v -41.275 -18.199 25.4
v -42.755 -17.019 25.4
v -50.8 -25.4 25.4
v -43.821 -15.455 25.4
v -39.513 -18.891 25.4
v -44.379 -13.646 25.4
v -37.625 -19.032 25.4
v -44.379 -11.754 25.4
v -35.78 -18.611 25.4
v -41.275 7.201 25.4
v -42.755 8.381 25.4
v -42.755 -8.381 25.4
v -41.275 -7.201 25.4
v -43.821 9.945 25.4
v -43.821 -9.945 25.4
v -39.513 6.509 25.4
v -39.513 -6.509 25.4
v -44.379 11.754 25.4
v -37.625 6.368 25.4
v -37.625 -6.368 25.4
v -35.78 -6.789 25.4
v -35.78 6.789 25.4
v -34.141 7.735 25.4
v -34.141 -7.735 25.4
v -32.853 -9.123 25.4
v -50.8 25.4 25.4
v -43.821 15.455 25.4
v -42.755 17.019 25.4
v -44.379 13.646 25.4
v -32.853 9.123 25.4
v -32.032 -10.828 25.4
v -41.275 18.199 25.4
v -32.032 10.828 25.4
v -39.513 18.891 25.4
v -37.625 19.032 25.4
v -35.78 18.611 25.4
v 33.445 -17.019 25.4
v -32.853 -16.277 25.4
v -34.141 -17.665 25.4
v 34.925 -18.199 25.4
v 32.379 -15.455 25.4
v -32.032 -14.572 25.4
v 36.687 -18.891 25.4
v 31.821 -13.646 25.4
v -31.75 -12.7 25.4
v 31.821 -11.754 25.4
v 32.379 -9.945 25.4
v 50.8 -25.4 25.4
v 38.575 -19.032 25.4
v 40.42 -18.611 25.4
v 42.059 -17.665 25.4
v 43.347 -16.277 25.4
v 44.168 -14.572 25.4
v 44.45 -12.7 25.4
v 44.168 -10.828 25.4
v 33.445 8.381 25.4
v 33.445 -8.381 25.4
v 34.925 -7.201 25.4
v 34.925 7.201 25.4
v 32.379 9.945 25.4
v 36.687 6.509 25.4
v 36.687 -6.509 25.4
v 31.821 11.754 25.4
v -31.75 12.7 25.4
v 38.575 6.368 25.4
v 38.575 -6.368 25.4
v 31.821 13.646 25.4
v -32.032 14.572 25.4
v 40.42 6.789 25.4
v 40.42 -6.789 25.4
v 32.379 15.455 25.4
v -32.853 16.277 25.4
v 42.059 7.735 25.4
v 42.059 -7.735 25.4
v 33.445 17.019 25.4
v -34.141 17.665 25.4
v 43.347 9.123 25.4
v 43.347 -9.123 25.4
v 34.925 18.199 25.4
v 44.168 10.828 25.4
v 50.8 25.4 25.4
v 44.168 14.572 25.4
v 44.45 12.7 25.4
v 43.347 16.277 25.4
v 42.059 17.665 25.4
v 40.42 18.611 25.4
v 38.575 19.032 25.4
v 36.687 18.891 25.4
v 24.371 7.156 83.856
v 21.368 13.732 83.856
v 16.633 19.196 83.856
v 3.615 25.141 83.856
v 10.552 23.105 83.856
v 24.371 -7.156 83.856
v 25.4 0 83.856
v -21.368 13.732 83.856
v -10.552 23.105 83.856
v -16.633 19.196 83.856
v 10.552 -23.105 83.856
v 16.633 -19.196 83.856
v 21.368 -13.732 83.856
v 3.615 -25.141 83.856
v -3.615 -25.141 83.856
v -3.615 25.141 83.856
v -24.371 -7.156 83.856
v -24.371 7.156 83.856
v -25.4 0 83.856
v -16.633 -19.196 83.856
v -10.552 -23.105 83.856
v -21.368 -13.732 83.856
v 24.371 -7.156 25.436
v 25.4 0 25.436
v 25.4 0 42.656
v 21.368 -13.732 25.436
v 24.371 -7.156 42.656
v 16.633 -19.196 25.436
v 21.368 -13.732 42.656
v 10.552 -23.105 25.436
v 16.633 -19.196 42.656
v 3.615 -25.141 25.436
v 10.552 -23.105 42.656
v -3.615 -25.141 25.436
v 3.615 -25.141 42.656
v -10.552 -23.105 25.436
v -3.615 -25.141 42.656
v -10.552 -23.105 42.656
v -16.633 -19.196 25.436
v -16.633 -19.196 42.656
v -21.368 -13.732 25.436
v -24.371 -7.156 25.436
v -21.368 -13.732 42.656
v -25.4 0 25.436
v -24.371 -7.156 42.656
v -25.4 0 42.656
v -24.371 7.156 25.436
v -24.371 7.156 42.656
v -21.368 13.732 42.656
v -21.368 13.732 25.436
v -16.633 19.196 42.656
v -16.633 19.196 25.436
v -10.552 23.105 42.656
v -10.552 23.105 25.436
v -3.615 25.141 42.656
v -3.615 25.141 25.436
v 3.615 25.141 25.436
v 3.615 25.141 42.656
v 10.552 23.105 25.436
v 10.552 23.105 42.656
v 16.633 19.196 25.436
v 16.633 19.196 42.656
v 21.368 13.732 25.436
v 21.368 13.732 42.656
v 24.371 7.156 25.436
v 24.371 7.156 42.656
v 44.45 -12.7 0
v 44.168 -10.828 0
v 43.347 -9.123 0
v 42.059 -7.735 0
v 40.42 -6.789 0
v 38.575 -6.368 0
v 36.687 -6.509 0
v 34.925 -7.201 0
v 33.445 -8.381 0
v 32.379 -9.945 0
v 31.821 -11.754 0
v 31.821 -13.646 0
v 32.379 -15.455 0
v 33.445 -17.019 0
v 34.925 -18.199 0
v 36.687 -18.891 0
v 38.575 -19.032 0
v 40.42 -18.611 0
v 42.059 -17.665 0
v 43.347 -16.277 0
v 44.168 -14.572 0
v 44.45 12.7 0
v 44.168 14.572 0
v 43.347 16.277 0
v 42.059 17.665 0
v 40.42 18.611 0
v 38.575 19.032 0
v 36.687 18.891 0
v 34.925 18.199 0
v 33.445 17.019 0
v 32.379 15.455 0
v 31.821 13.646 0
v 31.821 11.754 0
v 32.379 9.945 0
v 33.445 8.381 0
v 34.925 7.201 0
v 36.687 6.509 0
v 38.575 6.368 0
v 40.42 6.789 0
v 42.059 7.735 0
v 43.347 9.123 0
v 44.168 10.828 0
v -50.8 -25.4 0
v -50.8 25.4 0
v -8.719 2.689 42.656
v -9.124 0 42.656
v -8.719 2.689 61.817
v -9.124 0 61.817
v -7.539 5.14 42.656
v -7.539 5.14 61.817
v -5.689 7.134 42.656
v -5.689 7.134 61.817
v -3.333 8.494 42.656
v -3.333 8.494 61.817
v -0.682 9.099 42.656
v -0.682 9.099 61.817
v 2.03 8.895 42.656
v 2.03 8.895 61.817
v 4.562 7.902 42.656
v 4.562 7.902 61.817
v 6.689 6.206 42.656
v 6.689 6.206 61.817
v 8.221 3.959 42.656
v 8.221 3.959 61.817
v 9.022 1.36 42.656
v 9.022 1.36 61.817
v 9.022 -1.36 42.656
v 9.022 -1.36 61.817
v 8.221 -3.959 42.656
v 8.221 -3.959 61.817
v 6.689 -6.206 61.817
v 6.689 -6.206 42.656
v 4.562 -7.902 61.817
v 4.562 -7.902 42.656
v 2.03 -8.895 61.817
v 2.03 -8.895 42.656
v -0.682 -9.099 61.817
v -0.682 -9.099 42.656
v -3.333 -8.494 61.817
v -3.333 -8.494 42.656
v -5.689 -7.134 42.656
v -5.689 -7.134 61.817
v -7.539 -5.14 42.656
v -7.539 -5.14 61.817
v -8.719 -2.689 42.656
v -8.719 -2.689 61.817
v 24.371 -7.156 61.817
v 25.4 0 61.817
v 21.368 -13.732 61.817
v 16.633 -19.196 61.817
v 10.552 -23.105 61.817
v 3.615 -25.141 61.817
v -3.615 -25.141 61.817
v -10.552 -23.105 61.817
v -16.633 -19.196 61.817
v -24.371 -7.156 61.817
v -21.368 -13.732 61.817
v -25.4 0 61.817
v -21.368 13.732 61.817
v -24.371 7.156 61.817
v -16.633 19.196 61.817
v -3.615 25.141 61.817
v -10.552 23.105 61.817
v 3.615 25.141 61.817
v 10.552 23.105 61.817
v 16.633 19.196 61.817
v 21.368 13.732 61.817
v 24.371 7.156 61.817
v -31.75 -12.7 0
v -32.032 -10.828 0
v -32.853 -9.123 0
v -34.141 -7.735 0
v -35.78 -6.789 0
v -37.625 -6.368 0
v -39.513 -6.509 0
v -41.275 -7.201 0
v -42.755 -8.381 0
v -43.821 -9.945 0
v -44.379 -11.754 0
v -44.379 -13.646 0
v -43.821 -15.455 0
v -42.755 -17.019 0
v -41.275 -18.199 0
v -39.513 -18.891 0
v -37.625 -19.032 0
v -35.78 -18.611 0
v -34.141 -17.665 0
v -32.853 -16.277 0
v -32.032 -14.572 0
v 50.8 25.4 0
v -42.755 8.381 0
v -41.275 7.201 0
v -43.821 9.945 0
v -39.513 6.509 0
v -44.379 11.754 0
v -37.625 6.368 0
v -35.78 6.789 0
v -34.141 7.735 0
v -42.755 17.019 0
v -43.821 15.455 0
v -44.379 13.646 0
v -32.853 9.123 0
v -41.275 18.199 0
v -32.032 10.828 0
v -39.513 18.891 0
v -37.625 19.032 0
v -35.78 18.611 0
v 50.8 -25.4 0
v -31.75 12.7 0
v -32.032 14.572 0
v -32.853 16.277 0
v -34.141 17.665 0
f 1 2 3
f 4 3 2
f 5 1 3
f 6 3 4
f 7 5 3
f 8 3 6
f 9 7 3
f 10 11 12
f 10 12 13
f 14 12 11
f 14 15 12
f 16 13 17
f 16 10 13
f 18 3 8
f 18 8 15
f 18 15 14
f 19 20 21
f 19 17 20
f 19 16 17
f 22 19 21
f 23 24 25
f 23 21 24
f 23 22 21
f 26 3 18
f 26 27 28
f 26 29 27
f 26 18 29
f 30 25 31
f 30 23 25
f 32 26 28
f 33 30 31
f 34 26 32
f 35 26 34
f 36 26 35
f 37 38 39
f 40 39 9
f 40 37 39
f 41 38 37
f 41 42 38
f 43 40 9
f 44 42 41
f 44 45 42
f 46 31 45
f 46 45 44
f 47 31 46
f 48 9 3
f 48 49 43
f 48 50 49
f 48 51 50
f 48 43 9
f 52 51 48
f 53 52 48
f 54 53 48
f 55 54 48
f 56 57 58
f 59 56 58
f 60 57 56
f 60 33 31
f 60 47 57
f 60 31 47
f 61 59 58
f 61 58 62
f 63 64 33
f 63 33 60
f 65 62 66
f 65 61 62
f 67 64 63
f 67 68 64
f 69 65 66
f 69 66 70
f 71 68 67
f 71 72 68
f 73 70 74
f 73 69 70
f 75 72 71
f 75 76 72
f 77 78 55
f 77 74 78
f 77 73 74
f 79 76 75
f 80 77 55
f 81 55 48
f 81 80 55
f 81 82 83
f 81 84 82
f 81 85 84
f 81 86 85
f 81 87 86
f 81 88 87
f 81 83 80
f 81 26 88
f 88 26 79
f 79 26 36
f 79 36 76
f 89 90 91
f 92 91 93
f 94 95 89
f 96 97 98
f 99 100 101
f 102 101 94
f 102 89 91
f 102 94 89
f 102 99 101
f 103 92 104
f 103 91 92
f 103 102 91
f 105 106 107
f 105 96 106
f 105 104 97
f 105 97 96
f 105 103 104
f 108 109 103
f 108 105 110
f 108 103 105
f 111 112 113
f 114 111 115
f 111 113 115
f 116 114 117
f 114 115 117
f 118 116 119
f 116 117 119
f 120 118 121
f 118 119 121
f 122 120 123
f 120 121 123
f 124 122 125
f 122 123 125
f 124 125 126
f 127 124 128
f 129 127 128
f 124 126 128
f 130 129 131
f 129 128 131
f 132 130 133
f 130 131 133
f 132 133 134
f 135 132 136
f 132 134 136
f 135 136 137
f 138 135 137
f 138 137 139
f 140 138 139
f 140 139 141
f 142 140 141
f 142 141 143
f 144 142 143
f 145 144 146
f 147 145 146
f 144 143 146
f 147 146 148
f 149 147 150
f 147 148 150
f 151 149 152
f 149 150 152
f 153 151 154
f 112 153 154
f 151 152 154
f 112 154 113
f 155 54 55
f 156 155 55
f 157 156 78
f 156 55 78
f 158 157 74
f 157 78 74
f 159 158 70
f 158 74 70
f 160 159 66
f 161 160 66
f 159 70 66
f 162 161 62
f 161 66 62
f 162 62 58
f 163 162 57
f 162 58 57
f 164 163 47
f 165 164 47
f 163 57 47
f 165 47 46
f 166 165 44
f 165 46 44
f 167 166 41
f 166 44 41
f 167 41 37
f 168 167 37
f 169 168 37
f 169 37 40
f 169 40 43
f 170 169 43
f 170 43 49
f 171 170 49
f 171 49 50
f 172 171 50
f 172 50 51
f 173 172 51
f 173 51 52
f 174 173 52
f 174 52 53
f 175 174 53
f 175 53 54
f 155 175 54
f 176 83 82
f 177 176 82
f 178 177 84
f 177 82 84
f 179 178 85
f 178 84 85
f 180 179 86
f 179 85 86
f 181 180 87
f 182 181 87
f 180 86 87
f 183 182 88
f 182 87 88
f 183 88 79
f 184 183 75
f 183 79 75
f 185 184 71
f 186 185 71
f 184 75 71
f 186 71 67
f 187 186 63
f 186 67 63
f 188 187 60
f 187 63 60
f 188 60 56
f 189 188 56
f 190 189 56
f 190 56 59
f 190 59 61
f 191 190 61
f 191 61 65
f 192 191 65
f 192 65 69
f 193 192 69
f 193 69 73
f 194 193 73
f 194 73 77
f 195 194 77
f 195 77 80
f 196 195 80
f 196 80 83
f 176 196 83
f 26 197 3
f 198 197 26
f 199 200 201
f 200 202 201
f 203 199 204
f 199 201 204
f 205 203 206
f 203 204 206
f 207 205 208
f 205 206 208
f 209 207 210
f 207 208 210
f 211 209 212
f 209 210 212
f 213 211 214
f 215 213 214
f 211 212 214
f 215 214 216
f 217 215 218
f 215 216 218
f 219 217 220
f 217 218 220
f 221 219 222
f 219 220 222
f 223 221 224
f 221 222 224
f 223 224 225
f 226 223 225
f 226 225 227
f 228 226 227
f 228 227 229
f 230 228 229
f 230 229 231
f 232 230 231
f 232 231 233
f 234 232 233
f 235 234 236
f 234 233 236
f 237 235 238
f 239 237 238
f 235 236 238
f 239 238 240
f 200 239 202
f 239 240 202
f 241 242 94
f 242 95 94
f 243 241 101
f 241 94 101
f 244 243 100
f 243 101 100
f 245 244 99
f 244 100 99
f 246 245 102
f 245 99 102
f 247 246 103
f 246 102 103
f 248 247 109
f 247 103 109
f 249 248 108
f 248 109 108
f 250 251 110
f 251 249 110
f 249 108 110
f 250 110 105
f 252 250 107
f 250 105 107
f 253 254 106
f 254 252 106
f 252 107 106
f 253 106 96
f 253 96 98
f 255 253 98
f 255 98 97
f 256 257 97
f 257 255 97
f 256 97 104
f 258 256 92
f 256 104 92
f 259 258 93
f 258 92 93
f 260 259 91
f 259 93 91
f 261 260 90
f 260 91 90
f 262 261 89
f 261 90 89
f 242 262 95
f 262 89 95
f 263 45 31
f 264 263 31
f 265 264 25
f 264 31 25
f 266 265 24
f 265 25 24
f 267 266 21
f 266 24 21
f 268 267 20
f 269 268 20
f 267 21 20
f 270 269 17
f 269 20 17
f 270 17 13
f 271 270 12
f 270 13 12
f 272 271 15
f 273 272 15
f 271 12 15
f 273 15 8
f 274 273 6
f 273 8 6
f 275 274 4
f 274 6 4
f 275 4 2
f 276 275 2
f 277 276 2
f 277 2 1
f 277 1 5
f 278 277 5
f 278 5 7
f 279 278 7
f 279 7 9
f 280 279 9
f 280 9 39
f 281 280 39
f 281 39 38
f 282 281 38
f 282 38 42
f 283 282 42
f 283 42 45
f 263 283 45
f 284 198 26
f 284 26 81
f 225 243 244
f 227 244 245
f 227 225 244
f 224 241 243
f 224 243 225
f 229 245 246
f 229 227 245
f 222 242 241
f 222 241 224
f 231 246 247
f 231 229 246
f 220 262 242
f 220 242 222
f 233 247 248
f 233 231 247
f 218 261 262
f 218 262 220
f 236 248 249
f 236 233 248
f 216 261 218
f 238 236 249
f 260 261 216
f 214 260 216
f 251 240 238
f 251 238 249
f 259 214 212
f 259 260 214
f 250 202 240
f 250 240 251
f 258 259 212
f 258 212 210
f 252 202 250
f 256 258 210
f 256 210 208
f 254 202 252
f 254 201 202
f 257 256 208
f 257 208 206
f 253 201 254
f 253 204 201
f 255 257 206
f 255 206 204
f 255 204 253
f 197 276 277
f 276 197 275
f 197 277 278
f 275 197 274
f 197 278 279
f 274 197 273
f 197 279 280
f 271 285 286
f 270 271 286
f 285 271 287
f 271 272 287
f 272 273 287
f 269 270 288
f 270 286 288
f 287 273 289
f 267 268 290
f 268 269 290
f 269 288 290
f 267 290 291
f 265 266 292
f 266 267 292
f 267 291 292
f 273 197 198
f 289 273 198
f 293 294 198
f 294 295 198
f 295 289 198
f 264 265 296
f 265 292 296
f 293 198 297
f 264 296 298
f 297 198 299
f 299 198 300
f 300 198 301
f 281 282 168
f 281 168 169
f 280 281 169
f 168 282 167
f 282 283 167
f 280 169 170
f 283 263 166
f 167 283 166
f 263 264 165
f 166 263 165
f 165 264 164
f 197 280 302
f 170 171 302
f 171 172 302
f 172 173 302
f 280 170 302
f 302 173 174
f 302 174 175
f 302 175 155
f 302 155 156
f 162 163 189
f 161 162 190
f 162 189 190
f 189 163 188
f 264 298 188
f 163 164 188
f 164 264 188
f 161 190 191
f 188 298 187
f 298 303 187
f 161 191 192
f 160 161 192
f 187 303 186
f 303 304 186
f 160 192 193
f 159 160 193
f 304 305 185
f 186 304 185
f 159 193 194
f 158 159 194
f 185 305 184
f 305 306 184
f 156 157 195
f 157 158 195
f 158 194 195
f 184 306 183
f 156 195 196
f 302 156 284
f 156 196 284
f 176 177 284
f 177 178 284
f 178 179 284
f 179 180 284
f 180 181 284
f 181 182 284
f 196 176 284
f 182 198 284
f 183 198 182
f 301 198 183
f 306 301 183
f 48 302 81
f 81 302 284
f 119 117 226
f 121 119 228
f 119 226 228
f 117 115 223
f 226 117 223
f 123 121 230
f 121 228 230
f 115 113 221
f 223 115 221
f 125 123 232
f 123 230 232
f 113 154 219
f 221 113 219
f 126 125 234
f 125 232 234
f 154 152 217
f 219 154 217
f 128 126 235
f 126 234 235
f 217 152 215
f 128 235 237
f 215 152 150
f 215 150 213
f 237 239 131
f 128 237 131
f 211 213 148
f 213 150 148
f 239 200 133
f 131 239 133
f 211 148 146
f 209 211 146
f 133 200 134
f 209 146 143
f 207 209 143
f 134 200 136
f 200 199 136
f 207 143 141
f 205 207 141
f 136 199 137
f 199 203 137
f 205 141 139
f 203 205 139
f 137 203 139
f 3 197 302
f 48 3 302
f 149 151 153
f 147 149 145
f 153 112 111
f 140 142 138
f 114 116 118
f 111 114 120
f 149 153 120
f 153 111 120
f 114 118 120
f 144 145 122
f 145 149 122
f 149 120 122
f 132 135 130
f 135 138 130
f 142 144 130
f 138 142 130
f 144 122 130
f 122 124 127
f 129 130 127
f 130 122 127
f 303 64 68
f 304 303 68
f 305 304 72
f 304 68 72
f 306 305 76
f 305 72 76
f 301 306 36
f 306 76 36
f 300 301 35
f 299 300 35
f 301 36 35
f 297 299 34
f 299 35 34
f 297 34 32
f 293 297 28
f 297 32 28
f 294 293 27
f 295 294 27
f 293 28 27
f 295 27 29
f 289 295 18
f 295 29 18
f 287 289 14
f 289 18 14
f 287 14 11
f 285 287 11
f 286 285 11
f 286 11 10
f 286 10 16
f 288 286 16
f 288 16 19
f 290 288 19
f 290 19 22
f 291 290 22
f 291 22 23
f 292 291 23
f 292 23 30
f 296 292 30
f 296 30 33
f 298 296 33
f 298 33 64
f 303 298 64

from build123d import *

# Parameters (mm, degrees)
F0_W     = 101.6
F0_H     = 50.8
F1_DEPTH = 25.4
F2_R     = 6.35
F3_DEPTH = 25.401
F4_W     = 25.4
F4_H     = 58.42
F6_W     = 54.745491
F6_H     = 19.160923


with BuildPart() as f1:
    # F0 (on Top) → F1 (new body)
    with BuildSketch(Plane.XY):
        Rectangle(F0_W, F0_H)
    extrude(amount=F1_DEPTH)

    # F2 (on face) → F3 (cut, through all)
    with BuildSketch(Plane.XY.offset(25.4)):
        with Locations((-38.1, 12.7)):
            Circle(F2_R)
        with Locations((-38.1, -12.7)):
            Circle(F2_R)
        with Locations((38.1, -12.7)):
            Circle(F2_R)
        with Locations((38.1, 12.7)):
            Circle(F2_R)
    extrude(amount=-F3_DEPTH, mode=Mode.SUBTRACT)


with BuildPart() as f5:
    # F4 (on Front) → F5 (revolve)
    with BuildSketch(Plane.XZ):
        with Locations((12.7, 54.645675)):
            Rectangle(F4_W, F4_H)
    revolve(axis=Axis((0, 0, 54.645675), (0, 0, -1)))

    # F6 (on Front) → F7 (revolve, cut)
    with BuildSketch(Plane.XZ):
        with Locations((-36.496992, 52.23632)):
            Rectangle(F6_W, F6_H)
    revolve(axis=Axis((0, 0, 54.645675), (0, 0, -1)), mode=Mode.SUBTRACT)


solid = Compound([f1.part, f5.part])
